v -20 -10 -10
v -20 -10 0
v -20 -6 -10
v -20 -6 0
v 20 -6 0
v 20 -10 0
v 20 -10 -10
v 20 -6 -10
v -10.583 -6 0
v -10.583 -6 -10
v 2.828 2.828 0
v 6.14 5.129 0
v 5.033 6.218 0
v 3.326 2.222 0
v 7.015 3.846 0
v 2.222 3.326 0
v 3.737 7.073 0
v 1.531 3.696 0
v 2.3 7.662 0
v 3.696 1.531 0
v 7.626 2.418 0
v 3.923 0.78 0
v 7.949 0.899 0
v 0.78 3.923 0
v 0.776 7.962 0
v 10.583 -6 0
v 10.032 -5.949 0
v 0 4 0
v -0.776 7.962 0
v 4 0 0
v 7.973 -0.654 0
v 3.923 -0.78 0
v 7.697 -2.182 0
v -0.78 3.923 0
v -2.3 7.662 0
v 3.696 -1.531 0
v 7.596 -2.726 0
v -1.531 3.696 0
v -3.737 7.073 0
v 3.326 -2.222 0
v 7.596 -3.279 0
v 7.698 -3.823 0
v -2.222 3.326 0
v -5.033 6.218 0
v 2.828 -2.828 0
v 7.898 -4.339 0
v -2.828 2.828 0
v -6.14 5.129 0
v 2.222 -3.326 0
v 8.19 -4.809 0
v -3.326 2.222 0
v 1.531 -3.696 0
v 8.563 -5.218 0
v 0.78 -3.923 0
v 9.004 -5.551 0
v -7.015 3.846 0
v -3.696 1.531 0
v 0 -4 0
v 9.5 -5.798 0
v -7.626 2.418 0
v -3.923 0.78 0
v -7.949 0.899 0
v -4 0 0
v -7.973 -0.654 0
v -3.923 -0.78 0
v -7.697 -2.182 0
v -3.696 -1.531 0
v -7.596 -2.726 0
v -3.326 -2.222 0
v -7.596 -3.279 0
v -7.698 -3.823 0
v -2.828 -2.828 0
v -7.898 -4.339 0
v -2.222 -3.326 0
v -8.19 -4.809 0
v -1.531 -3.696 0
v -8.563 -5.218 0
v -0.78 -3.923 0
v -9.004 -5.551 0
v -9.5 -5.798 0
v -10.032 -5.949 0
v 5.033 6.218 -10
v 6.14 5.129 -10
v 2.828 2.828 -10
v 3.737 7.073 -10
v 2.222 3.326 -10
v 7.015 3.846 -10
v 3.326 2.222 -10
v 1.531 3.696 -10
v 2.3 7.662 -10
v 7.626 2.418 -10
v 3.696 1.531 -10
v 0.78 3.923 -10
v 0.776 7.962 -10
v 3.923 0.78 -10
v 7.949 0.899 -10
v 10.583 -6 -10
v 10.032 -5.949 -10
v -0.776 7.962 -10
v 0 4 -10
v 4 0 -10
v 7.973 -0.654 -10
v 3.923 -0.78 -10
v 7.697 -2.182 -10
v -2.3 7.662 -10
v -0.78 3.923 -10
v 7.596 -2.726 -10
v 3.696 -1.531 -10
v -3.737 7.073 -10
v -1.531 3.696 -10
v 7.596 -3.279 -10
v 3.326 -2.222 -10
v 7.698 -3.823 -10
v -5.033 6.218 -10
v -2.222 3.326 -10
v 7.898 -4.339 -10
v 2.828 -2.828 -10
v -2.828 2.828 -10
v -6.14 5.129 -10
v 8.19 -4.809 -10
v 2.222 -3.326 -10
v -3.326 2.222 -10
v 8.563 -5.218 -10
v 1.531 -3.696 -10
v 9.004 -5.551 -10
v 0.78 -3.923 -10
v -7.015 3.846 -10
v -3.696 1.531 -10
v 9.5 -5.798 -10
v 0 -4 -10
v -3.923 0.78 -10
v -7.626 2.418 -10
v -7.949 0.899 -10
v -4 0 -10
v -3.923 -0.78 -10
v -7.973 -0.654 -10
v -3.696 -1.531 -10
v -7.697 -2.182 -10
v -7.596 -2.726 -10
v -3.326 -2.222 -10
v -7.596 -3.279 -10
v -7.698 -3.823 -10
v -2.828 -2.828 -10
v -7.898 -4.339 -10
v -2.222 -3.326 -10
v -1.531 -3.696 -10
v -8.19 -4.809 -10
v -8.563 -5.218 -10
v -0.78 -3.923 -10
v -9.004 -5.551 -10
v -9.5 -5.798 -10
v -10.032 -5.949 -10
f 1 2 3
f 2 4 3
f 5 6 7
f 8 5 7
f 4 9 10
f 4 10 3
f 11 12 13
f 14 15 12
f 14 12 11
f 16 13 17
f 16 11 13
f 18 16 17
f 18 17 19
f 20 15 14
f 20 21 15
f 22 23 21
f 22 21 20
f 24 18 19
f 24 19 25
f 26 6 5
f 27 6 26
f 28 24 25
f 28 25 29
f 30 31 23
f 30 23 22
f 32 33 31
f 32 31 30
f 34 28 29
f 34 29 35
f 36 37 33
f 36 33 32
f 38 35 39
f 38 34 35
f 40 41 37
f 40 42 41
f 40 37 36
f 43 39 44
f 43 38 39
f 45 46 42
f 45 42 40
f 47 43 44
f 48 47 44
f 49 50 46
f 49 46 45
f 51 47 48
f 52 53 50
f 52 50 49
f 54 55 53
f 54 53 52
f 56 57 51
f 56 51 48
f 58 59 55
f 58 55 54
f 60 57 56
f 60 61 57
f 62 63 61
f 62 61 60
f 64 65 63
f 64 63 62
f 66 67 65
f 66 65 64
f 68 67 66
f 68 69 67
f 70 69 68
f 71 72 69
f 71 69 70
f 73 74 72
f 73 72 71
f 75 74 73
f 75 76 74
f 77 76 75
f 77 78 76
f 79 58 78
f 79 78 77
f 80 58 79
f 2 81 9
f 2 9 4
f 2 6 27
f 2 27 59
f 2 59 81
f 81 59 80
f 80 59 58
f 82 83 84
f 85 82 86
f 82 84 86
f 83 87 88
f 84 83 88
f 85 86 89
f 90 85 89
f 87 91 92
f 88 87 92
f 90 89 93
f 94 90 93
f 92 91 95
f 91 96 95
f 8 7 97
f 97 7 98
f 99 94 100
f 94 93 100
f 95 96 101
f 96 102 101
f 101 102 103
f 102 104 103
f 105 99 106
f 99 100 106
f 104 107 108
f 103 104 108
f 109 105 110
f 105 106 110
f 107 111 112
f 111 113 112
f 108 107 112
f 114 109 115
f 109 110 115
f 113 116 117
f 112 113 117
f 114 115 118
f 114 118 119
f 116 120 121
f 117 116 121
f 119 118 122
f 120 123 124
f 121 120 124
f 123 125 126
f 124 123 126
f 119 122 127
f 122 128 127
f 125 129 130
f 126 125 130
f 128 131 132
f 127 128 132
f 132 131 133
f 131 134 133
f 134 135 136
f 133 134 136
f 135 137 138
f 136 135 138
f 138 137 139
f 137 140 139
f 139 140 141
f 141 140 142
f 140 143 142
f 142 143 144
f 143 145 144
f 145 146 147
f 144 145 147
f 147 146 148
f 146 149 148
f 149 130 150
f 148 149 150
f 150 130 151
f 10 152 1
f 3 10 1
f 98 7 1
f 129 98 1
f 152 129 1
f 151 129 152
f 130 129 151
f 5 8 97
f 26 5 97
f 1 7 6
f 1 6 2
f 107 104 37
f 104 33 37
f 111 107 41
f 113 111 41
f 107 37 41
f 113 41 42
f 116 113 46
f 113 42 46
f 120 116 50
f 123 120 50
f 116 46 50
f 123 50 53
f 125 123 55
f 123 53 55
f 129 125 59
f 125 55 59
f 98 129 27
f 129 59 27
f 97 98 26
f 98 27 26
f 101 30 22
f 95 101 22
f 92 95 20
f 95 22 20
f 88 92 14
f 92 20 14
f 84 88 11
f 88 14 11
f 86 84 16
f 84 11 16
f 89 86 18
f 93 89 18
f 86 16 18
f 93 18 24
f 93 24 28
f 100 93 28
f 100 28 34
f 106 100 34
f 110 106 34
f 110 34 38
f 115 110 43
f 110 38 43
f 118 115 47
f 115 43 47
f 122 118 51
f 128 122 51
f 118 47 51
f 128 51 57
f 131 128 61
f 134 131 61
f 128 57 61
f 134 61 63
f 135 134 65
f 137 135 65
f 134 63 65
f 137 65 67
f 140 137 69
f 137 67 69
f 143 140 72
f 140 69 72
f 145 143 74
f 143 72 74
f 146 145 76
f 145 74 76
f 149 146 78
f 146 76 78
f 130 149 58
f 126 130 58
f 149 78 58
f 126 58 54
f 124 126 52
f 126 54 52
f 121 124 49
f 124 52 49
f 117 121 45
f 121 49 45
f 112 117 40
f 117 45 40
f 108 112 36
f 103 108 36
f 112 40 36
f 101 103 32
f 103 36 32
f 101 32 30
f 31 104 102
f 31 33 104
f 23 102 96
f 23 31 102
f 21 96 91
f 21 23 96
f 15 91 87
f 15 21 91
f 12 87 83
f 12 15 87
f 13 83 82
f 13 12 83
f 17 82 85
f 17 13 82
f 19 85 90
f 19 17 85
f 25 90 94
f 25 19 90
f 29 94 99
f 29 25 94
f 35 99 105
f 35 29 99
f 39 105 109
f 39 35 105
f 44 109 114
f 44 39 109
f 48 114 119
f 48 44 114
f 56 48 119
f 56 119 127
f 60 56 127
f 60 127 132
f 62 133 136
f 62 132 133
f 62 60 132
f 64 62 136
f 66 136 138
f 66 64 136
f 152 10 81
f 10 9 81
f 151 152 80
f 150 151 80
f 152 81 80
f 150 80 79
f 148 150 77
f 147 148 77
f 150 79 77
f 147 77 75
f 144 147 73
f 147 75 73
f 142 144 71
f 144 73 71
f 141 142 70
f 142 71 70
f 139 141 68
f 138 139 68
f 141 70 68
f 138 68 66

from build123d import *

# Parameters (mm, degrees)
SKETCH1_R                = 8
SKETCH1_R_2              = 4
BOSS_EXTRUDE1_DEPTH      = 10
BOSS_EXTRUDE3_DEPTH      = 2
BOSS_EXTRUDE3_DEPTH_BACK = 2
SKETCH2_W                = 40
SKETCH2_H                = 10
FILLET1_R                = 3


with BuildPart() as part:
    # Sketch1 → Boss-Extrude1 (new body)
    with BuildSketch(Plane.XY):
        Circle(SKETCH1_R)
        Circle(SKETCH1_R_2, mode=Mode.SUBTRACT)
    extrude(amount=-BOSS_EXTRUDE1_DEPTH)

    # Sketch2 → Boss-Extrude3 (add, two sides: drawn at the far end of the back side and taken through both)
    with BuildSketch(Plane(origin=(0, -8, 0), x_dir=(-1, 0, 0), z_dir=(0, -1, 0)).offset(-BOSS_EXTRUDE3_DEPTH_BACK)):
        with Locations((0, 5)):
            Rectangle(SKETCH2_W, SKETCH2_H)
    extrude(amount=BOSS_EXTRUDE3_DEPTH + BOSS_EXTRUDE3_DEPTH_BACK)

    # Fillet1
    fillet1_edges = [part.edges().sort_by_distance(p)[0] for p in [
        (5.291502622, -6, -5),
        (-5.291502622, -6, -5),
    ]]
    fillet(fillet1_edges, radius=FILLET1_R)


solid = part.part
